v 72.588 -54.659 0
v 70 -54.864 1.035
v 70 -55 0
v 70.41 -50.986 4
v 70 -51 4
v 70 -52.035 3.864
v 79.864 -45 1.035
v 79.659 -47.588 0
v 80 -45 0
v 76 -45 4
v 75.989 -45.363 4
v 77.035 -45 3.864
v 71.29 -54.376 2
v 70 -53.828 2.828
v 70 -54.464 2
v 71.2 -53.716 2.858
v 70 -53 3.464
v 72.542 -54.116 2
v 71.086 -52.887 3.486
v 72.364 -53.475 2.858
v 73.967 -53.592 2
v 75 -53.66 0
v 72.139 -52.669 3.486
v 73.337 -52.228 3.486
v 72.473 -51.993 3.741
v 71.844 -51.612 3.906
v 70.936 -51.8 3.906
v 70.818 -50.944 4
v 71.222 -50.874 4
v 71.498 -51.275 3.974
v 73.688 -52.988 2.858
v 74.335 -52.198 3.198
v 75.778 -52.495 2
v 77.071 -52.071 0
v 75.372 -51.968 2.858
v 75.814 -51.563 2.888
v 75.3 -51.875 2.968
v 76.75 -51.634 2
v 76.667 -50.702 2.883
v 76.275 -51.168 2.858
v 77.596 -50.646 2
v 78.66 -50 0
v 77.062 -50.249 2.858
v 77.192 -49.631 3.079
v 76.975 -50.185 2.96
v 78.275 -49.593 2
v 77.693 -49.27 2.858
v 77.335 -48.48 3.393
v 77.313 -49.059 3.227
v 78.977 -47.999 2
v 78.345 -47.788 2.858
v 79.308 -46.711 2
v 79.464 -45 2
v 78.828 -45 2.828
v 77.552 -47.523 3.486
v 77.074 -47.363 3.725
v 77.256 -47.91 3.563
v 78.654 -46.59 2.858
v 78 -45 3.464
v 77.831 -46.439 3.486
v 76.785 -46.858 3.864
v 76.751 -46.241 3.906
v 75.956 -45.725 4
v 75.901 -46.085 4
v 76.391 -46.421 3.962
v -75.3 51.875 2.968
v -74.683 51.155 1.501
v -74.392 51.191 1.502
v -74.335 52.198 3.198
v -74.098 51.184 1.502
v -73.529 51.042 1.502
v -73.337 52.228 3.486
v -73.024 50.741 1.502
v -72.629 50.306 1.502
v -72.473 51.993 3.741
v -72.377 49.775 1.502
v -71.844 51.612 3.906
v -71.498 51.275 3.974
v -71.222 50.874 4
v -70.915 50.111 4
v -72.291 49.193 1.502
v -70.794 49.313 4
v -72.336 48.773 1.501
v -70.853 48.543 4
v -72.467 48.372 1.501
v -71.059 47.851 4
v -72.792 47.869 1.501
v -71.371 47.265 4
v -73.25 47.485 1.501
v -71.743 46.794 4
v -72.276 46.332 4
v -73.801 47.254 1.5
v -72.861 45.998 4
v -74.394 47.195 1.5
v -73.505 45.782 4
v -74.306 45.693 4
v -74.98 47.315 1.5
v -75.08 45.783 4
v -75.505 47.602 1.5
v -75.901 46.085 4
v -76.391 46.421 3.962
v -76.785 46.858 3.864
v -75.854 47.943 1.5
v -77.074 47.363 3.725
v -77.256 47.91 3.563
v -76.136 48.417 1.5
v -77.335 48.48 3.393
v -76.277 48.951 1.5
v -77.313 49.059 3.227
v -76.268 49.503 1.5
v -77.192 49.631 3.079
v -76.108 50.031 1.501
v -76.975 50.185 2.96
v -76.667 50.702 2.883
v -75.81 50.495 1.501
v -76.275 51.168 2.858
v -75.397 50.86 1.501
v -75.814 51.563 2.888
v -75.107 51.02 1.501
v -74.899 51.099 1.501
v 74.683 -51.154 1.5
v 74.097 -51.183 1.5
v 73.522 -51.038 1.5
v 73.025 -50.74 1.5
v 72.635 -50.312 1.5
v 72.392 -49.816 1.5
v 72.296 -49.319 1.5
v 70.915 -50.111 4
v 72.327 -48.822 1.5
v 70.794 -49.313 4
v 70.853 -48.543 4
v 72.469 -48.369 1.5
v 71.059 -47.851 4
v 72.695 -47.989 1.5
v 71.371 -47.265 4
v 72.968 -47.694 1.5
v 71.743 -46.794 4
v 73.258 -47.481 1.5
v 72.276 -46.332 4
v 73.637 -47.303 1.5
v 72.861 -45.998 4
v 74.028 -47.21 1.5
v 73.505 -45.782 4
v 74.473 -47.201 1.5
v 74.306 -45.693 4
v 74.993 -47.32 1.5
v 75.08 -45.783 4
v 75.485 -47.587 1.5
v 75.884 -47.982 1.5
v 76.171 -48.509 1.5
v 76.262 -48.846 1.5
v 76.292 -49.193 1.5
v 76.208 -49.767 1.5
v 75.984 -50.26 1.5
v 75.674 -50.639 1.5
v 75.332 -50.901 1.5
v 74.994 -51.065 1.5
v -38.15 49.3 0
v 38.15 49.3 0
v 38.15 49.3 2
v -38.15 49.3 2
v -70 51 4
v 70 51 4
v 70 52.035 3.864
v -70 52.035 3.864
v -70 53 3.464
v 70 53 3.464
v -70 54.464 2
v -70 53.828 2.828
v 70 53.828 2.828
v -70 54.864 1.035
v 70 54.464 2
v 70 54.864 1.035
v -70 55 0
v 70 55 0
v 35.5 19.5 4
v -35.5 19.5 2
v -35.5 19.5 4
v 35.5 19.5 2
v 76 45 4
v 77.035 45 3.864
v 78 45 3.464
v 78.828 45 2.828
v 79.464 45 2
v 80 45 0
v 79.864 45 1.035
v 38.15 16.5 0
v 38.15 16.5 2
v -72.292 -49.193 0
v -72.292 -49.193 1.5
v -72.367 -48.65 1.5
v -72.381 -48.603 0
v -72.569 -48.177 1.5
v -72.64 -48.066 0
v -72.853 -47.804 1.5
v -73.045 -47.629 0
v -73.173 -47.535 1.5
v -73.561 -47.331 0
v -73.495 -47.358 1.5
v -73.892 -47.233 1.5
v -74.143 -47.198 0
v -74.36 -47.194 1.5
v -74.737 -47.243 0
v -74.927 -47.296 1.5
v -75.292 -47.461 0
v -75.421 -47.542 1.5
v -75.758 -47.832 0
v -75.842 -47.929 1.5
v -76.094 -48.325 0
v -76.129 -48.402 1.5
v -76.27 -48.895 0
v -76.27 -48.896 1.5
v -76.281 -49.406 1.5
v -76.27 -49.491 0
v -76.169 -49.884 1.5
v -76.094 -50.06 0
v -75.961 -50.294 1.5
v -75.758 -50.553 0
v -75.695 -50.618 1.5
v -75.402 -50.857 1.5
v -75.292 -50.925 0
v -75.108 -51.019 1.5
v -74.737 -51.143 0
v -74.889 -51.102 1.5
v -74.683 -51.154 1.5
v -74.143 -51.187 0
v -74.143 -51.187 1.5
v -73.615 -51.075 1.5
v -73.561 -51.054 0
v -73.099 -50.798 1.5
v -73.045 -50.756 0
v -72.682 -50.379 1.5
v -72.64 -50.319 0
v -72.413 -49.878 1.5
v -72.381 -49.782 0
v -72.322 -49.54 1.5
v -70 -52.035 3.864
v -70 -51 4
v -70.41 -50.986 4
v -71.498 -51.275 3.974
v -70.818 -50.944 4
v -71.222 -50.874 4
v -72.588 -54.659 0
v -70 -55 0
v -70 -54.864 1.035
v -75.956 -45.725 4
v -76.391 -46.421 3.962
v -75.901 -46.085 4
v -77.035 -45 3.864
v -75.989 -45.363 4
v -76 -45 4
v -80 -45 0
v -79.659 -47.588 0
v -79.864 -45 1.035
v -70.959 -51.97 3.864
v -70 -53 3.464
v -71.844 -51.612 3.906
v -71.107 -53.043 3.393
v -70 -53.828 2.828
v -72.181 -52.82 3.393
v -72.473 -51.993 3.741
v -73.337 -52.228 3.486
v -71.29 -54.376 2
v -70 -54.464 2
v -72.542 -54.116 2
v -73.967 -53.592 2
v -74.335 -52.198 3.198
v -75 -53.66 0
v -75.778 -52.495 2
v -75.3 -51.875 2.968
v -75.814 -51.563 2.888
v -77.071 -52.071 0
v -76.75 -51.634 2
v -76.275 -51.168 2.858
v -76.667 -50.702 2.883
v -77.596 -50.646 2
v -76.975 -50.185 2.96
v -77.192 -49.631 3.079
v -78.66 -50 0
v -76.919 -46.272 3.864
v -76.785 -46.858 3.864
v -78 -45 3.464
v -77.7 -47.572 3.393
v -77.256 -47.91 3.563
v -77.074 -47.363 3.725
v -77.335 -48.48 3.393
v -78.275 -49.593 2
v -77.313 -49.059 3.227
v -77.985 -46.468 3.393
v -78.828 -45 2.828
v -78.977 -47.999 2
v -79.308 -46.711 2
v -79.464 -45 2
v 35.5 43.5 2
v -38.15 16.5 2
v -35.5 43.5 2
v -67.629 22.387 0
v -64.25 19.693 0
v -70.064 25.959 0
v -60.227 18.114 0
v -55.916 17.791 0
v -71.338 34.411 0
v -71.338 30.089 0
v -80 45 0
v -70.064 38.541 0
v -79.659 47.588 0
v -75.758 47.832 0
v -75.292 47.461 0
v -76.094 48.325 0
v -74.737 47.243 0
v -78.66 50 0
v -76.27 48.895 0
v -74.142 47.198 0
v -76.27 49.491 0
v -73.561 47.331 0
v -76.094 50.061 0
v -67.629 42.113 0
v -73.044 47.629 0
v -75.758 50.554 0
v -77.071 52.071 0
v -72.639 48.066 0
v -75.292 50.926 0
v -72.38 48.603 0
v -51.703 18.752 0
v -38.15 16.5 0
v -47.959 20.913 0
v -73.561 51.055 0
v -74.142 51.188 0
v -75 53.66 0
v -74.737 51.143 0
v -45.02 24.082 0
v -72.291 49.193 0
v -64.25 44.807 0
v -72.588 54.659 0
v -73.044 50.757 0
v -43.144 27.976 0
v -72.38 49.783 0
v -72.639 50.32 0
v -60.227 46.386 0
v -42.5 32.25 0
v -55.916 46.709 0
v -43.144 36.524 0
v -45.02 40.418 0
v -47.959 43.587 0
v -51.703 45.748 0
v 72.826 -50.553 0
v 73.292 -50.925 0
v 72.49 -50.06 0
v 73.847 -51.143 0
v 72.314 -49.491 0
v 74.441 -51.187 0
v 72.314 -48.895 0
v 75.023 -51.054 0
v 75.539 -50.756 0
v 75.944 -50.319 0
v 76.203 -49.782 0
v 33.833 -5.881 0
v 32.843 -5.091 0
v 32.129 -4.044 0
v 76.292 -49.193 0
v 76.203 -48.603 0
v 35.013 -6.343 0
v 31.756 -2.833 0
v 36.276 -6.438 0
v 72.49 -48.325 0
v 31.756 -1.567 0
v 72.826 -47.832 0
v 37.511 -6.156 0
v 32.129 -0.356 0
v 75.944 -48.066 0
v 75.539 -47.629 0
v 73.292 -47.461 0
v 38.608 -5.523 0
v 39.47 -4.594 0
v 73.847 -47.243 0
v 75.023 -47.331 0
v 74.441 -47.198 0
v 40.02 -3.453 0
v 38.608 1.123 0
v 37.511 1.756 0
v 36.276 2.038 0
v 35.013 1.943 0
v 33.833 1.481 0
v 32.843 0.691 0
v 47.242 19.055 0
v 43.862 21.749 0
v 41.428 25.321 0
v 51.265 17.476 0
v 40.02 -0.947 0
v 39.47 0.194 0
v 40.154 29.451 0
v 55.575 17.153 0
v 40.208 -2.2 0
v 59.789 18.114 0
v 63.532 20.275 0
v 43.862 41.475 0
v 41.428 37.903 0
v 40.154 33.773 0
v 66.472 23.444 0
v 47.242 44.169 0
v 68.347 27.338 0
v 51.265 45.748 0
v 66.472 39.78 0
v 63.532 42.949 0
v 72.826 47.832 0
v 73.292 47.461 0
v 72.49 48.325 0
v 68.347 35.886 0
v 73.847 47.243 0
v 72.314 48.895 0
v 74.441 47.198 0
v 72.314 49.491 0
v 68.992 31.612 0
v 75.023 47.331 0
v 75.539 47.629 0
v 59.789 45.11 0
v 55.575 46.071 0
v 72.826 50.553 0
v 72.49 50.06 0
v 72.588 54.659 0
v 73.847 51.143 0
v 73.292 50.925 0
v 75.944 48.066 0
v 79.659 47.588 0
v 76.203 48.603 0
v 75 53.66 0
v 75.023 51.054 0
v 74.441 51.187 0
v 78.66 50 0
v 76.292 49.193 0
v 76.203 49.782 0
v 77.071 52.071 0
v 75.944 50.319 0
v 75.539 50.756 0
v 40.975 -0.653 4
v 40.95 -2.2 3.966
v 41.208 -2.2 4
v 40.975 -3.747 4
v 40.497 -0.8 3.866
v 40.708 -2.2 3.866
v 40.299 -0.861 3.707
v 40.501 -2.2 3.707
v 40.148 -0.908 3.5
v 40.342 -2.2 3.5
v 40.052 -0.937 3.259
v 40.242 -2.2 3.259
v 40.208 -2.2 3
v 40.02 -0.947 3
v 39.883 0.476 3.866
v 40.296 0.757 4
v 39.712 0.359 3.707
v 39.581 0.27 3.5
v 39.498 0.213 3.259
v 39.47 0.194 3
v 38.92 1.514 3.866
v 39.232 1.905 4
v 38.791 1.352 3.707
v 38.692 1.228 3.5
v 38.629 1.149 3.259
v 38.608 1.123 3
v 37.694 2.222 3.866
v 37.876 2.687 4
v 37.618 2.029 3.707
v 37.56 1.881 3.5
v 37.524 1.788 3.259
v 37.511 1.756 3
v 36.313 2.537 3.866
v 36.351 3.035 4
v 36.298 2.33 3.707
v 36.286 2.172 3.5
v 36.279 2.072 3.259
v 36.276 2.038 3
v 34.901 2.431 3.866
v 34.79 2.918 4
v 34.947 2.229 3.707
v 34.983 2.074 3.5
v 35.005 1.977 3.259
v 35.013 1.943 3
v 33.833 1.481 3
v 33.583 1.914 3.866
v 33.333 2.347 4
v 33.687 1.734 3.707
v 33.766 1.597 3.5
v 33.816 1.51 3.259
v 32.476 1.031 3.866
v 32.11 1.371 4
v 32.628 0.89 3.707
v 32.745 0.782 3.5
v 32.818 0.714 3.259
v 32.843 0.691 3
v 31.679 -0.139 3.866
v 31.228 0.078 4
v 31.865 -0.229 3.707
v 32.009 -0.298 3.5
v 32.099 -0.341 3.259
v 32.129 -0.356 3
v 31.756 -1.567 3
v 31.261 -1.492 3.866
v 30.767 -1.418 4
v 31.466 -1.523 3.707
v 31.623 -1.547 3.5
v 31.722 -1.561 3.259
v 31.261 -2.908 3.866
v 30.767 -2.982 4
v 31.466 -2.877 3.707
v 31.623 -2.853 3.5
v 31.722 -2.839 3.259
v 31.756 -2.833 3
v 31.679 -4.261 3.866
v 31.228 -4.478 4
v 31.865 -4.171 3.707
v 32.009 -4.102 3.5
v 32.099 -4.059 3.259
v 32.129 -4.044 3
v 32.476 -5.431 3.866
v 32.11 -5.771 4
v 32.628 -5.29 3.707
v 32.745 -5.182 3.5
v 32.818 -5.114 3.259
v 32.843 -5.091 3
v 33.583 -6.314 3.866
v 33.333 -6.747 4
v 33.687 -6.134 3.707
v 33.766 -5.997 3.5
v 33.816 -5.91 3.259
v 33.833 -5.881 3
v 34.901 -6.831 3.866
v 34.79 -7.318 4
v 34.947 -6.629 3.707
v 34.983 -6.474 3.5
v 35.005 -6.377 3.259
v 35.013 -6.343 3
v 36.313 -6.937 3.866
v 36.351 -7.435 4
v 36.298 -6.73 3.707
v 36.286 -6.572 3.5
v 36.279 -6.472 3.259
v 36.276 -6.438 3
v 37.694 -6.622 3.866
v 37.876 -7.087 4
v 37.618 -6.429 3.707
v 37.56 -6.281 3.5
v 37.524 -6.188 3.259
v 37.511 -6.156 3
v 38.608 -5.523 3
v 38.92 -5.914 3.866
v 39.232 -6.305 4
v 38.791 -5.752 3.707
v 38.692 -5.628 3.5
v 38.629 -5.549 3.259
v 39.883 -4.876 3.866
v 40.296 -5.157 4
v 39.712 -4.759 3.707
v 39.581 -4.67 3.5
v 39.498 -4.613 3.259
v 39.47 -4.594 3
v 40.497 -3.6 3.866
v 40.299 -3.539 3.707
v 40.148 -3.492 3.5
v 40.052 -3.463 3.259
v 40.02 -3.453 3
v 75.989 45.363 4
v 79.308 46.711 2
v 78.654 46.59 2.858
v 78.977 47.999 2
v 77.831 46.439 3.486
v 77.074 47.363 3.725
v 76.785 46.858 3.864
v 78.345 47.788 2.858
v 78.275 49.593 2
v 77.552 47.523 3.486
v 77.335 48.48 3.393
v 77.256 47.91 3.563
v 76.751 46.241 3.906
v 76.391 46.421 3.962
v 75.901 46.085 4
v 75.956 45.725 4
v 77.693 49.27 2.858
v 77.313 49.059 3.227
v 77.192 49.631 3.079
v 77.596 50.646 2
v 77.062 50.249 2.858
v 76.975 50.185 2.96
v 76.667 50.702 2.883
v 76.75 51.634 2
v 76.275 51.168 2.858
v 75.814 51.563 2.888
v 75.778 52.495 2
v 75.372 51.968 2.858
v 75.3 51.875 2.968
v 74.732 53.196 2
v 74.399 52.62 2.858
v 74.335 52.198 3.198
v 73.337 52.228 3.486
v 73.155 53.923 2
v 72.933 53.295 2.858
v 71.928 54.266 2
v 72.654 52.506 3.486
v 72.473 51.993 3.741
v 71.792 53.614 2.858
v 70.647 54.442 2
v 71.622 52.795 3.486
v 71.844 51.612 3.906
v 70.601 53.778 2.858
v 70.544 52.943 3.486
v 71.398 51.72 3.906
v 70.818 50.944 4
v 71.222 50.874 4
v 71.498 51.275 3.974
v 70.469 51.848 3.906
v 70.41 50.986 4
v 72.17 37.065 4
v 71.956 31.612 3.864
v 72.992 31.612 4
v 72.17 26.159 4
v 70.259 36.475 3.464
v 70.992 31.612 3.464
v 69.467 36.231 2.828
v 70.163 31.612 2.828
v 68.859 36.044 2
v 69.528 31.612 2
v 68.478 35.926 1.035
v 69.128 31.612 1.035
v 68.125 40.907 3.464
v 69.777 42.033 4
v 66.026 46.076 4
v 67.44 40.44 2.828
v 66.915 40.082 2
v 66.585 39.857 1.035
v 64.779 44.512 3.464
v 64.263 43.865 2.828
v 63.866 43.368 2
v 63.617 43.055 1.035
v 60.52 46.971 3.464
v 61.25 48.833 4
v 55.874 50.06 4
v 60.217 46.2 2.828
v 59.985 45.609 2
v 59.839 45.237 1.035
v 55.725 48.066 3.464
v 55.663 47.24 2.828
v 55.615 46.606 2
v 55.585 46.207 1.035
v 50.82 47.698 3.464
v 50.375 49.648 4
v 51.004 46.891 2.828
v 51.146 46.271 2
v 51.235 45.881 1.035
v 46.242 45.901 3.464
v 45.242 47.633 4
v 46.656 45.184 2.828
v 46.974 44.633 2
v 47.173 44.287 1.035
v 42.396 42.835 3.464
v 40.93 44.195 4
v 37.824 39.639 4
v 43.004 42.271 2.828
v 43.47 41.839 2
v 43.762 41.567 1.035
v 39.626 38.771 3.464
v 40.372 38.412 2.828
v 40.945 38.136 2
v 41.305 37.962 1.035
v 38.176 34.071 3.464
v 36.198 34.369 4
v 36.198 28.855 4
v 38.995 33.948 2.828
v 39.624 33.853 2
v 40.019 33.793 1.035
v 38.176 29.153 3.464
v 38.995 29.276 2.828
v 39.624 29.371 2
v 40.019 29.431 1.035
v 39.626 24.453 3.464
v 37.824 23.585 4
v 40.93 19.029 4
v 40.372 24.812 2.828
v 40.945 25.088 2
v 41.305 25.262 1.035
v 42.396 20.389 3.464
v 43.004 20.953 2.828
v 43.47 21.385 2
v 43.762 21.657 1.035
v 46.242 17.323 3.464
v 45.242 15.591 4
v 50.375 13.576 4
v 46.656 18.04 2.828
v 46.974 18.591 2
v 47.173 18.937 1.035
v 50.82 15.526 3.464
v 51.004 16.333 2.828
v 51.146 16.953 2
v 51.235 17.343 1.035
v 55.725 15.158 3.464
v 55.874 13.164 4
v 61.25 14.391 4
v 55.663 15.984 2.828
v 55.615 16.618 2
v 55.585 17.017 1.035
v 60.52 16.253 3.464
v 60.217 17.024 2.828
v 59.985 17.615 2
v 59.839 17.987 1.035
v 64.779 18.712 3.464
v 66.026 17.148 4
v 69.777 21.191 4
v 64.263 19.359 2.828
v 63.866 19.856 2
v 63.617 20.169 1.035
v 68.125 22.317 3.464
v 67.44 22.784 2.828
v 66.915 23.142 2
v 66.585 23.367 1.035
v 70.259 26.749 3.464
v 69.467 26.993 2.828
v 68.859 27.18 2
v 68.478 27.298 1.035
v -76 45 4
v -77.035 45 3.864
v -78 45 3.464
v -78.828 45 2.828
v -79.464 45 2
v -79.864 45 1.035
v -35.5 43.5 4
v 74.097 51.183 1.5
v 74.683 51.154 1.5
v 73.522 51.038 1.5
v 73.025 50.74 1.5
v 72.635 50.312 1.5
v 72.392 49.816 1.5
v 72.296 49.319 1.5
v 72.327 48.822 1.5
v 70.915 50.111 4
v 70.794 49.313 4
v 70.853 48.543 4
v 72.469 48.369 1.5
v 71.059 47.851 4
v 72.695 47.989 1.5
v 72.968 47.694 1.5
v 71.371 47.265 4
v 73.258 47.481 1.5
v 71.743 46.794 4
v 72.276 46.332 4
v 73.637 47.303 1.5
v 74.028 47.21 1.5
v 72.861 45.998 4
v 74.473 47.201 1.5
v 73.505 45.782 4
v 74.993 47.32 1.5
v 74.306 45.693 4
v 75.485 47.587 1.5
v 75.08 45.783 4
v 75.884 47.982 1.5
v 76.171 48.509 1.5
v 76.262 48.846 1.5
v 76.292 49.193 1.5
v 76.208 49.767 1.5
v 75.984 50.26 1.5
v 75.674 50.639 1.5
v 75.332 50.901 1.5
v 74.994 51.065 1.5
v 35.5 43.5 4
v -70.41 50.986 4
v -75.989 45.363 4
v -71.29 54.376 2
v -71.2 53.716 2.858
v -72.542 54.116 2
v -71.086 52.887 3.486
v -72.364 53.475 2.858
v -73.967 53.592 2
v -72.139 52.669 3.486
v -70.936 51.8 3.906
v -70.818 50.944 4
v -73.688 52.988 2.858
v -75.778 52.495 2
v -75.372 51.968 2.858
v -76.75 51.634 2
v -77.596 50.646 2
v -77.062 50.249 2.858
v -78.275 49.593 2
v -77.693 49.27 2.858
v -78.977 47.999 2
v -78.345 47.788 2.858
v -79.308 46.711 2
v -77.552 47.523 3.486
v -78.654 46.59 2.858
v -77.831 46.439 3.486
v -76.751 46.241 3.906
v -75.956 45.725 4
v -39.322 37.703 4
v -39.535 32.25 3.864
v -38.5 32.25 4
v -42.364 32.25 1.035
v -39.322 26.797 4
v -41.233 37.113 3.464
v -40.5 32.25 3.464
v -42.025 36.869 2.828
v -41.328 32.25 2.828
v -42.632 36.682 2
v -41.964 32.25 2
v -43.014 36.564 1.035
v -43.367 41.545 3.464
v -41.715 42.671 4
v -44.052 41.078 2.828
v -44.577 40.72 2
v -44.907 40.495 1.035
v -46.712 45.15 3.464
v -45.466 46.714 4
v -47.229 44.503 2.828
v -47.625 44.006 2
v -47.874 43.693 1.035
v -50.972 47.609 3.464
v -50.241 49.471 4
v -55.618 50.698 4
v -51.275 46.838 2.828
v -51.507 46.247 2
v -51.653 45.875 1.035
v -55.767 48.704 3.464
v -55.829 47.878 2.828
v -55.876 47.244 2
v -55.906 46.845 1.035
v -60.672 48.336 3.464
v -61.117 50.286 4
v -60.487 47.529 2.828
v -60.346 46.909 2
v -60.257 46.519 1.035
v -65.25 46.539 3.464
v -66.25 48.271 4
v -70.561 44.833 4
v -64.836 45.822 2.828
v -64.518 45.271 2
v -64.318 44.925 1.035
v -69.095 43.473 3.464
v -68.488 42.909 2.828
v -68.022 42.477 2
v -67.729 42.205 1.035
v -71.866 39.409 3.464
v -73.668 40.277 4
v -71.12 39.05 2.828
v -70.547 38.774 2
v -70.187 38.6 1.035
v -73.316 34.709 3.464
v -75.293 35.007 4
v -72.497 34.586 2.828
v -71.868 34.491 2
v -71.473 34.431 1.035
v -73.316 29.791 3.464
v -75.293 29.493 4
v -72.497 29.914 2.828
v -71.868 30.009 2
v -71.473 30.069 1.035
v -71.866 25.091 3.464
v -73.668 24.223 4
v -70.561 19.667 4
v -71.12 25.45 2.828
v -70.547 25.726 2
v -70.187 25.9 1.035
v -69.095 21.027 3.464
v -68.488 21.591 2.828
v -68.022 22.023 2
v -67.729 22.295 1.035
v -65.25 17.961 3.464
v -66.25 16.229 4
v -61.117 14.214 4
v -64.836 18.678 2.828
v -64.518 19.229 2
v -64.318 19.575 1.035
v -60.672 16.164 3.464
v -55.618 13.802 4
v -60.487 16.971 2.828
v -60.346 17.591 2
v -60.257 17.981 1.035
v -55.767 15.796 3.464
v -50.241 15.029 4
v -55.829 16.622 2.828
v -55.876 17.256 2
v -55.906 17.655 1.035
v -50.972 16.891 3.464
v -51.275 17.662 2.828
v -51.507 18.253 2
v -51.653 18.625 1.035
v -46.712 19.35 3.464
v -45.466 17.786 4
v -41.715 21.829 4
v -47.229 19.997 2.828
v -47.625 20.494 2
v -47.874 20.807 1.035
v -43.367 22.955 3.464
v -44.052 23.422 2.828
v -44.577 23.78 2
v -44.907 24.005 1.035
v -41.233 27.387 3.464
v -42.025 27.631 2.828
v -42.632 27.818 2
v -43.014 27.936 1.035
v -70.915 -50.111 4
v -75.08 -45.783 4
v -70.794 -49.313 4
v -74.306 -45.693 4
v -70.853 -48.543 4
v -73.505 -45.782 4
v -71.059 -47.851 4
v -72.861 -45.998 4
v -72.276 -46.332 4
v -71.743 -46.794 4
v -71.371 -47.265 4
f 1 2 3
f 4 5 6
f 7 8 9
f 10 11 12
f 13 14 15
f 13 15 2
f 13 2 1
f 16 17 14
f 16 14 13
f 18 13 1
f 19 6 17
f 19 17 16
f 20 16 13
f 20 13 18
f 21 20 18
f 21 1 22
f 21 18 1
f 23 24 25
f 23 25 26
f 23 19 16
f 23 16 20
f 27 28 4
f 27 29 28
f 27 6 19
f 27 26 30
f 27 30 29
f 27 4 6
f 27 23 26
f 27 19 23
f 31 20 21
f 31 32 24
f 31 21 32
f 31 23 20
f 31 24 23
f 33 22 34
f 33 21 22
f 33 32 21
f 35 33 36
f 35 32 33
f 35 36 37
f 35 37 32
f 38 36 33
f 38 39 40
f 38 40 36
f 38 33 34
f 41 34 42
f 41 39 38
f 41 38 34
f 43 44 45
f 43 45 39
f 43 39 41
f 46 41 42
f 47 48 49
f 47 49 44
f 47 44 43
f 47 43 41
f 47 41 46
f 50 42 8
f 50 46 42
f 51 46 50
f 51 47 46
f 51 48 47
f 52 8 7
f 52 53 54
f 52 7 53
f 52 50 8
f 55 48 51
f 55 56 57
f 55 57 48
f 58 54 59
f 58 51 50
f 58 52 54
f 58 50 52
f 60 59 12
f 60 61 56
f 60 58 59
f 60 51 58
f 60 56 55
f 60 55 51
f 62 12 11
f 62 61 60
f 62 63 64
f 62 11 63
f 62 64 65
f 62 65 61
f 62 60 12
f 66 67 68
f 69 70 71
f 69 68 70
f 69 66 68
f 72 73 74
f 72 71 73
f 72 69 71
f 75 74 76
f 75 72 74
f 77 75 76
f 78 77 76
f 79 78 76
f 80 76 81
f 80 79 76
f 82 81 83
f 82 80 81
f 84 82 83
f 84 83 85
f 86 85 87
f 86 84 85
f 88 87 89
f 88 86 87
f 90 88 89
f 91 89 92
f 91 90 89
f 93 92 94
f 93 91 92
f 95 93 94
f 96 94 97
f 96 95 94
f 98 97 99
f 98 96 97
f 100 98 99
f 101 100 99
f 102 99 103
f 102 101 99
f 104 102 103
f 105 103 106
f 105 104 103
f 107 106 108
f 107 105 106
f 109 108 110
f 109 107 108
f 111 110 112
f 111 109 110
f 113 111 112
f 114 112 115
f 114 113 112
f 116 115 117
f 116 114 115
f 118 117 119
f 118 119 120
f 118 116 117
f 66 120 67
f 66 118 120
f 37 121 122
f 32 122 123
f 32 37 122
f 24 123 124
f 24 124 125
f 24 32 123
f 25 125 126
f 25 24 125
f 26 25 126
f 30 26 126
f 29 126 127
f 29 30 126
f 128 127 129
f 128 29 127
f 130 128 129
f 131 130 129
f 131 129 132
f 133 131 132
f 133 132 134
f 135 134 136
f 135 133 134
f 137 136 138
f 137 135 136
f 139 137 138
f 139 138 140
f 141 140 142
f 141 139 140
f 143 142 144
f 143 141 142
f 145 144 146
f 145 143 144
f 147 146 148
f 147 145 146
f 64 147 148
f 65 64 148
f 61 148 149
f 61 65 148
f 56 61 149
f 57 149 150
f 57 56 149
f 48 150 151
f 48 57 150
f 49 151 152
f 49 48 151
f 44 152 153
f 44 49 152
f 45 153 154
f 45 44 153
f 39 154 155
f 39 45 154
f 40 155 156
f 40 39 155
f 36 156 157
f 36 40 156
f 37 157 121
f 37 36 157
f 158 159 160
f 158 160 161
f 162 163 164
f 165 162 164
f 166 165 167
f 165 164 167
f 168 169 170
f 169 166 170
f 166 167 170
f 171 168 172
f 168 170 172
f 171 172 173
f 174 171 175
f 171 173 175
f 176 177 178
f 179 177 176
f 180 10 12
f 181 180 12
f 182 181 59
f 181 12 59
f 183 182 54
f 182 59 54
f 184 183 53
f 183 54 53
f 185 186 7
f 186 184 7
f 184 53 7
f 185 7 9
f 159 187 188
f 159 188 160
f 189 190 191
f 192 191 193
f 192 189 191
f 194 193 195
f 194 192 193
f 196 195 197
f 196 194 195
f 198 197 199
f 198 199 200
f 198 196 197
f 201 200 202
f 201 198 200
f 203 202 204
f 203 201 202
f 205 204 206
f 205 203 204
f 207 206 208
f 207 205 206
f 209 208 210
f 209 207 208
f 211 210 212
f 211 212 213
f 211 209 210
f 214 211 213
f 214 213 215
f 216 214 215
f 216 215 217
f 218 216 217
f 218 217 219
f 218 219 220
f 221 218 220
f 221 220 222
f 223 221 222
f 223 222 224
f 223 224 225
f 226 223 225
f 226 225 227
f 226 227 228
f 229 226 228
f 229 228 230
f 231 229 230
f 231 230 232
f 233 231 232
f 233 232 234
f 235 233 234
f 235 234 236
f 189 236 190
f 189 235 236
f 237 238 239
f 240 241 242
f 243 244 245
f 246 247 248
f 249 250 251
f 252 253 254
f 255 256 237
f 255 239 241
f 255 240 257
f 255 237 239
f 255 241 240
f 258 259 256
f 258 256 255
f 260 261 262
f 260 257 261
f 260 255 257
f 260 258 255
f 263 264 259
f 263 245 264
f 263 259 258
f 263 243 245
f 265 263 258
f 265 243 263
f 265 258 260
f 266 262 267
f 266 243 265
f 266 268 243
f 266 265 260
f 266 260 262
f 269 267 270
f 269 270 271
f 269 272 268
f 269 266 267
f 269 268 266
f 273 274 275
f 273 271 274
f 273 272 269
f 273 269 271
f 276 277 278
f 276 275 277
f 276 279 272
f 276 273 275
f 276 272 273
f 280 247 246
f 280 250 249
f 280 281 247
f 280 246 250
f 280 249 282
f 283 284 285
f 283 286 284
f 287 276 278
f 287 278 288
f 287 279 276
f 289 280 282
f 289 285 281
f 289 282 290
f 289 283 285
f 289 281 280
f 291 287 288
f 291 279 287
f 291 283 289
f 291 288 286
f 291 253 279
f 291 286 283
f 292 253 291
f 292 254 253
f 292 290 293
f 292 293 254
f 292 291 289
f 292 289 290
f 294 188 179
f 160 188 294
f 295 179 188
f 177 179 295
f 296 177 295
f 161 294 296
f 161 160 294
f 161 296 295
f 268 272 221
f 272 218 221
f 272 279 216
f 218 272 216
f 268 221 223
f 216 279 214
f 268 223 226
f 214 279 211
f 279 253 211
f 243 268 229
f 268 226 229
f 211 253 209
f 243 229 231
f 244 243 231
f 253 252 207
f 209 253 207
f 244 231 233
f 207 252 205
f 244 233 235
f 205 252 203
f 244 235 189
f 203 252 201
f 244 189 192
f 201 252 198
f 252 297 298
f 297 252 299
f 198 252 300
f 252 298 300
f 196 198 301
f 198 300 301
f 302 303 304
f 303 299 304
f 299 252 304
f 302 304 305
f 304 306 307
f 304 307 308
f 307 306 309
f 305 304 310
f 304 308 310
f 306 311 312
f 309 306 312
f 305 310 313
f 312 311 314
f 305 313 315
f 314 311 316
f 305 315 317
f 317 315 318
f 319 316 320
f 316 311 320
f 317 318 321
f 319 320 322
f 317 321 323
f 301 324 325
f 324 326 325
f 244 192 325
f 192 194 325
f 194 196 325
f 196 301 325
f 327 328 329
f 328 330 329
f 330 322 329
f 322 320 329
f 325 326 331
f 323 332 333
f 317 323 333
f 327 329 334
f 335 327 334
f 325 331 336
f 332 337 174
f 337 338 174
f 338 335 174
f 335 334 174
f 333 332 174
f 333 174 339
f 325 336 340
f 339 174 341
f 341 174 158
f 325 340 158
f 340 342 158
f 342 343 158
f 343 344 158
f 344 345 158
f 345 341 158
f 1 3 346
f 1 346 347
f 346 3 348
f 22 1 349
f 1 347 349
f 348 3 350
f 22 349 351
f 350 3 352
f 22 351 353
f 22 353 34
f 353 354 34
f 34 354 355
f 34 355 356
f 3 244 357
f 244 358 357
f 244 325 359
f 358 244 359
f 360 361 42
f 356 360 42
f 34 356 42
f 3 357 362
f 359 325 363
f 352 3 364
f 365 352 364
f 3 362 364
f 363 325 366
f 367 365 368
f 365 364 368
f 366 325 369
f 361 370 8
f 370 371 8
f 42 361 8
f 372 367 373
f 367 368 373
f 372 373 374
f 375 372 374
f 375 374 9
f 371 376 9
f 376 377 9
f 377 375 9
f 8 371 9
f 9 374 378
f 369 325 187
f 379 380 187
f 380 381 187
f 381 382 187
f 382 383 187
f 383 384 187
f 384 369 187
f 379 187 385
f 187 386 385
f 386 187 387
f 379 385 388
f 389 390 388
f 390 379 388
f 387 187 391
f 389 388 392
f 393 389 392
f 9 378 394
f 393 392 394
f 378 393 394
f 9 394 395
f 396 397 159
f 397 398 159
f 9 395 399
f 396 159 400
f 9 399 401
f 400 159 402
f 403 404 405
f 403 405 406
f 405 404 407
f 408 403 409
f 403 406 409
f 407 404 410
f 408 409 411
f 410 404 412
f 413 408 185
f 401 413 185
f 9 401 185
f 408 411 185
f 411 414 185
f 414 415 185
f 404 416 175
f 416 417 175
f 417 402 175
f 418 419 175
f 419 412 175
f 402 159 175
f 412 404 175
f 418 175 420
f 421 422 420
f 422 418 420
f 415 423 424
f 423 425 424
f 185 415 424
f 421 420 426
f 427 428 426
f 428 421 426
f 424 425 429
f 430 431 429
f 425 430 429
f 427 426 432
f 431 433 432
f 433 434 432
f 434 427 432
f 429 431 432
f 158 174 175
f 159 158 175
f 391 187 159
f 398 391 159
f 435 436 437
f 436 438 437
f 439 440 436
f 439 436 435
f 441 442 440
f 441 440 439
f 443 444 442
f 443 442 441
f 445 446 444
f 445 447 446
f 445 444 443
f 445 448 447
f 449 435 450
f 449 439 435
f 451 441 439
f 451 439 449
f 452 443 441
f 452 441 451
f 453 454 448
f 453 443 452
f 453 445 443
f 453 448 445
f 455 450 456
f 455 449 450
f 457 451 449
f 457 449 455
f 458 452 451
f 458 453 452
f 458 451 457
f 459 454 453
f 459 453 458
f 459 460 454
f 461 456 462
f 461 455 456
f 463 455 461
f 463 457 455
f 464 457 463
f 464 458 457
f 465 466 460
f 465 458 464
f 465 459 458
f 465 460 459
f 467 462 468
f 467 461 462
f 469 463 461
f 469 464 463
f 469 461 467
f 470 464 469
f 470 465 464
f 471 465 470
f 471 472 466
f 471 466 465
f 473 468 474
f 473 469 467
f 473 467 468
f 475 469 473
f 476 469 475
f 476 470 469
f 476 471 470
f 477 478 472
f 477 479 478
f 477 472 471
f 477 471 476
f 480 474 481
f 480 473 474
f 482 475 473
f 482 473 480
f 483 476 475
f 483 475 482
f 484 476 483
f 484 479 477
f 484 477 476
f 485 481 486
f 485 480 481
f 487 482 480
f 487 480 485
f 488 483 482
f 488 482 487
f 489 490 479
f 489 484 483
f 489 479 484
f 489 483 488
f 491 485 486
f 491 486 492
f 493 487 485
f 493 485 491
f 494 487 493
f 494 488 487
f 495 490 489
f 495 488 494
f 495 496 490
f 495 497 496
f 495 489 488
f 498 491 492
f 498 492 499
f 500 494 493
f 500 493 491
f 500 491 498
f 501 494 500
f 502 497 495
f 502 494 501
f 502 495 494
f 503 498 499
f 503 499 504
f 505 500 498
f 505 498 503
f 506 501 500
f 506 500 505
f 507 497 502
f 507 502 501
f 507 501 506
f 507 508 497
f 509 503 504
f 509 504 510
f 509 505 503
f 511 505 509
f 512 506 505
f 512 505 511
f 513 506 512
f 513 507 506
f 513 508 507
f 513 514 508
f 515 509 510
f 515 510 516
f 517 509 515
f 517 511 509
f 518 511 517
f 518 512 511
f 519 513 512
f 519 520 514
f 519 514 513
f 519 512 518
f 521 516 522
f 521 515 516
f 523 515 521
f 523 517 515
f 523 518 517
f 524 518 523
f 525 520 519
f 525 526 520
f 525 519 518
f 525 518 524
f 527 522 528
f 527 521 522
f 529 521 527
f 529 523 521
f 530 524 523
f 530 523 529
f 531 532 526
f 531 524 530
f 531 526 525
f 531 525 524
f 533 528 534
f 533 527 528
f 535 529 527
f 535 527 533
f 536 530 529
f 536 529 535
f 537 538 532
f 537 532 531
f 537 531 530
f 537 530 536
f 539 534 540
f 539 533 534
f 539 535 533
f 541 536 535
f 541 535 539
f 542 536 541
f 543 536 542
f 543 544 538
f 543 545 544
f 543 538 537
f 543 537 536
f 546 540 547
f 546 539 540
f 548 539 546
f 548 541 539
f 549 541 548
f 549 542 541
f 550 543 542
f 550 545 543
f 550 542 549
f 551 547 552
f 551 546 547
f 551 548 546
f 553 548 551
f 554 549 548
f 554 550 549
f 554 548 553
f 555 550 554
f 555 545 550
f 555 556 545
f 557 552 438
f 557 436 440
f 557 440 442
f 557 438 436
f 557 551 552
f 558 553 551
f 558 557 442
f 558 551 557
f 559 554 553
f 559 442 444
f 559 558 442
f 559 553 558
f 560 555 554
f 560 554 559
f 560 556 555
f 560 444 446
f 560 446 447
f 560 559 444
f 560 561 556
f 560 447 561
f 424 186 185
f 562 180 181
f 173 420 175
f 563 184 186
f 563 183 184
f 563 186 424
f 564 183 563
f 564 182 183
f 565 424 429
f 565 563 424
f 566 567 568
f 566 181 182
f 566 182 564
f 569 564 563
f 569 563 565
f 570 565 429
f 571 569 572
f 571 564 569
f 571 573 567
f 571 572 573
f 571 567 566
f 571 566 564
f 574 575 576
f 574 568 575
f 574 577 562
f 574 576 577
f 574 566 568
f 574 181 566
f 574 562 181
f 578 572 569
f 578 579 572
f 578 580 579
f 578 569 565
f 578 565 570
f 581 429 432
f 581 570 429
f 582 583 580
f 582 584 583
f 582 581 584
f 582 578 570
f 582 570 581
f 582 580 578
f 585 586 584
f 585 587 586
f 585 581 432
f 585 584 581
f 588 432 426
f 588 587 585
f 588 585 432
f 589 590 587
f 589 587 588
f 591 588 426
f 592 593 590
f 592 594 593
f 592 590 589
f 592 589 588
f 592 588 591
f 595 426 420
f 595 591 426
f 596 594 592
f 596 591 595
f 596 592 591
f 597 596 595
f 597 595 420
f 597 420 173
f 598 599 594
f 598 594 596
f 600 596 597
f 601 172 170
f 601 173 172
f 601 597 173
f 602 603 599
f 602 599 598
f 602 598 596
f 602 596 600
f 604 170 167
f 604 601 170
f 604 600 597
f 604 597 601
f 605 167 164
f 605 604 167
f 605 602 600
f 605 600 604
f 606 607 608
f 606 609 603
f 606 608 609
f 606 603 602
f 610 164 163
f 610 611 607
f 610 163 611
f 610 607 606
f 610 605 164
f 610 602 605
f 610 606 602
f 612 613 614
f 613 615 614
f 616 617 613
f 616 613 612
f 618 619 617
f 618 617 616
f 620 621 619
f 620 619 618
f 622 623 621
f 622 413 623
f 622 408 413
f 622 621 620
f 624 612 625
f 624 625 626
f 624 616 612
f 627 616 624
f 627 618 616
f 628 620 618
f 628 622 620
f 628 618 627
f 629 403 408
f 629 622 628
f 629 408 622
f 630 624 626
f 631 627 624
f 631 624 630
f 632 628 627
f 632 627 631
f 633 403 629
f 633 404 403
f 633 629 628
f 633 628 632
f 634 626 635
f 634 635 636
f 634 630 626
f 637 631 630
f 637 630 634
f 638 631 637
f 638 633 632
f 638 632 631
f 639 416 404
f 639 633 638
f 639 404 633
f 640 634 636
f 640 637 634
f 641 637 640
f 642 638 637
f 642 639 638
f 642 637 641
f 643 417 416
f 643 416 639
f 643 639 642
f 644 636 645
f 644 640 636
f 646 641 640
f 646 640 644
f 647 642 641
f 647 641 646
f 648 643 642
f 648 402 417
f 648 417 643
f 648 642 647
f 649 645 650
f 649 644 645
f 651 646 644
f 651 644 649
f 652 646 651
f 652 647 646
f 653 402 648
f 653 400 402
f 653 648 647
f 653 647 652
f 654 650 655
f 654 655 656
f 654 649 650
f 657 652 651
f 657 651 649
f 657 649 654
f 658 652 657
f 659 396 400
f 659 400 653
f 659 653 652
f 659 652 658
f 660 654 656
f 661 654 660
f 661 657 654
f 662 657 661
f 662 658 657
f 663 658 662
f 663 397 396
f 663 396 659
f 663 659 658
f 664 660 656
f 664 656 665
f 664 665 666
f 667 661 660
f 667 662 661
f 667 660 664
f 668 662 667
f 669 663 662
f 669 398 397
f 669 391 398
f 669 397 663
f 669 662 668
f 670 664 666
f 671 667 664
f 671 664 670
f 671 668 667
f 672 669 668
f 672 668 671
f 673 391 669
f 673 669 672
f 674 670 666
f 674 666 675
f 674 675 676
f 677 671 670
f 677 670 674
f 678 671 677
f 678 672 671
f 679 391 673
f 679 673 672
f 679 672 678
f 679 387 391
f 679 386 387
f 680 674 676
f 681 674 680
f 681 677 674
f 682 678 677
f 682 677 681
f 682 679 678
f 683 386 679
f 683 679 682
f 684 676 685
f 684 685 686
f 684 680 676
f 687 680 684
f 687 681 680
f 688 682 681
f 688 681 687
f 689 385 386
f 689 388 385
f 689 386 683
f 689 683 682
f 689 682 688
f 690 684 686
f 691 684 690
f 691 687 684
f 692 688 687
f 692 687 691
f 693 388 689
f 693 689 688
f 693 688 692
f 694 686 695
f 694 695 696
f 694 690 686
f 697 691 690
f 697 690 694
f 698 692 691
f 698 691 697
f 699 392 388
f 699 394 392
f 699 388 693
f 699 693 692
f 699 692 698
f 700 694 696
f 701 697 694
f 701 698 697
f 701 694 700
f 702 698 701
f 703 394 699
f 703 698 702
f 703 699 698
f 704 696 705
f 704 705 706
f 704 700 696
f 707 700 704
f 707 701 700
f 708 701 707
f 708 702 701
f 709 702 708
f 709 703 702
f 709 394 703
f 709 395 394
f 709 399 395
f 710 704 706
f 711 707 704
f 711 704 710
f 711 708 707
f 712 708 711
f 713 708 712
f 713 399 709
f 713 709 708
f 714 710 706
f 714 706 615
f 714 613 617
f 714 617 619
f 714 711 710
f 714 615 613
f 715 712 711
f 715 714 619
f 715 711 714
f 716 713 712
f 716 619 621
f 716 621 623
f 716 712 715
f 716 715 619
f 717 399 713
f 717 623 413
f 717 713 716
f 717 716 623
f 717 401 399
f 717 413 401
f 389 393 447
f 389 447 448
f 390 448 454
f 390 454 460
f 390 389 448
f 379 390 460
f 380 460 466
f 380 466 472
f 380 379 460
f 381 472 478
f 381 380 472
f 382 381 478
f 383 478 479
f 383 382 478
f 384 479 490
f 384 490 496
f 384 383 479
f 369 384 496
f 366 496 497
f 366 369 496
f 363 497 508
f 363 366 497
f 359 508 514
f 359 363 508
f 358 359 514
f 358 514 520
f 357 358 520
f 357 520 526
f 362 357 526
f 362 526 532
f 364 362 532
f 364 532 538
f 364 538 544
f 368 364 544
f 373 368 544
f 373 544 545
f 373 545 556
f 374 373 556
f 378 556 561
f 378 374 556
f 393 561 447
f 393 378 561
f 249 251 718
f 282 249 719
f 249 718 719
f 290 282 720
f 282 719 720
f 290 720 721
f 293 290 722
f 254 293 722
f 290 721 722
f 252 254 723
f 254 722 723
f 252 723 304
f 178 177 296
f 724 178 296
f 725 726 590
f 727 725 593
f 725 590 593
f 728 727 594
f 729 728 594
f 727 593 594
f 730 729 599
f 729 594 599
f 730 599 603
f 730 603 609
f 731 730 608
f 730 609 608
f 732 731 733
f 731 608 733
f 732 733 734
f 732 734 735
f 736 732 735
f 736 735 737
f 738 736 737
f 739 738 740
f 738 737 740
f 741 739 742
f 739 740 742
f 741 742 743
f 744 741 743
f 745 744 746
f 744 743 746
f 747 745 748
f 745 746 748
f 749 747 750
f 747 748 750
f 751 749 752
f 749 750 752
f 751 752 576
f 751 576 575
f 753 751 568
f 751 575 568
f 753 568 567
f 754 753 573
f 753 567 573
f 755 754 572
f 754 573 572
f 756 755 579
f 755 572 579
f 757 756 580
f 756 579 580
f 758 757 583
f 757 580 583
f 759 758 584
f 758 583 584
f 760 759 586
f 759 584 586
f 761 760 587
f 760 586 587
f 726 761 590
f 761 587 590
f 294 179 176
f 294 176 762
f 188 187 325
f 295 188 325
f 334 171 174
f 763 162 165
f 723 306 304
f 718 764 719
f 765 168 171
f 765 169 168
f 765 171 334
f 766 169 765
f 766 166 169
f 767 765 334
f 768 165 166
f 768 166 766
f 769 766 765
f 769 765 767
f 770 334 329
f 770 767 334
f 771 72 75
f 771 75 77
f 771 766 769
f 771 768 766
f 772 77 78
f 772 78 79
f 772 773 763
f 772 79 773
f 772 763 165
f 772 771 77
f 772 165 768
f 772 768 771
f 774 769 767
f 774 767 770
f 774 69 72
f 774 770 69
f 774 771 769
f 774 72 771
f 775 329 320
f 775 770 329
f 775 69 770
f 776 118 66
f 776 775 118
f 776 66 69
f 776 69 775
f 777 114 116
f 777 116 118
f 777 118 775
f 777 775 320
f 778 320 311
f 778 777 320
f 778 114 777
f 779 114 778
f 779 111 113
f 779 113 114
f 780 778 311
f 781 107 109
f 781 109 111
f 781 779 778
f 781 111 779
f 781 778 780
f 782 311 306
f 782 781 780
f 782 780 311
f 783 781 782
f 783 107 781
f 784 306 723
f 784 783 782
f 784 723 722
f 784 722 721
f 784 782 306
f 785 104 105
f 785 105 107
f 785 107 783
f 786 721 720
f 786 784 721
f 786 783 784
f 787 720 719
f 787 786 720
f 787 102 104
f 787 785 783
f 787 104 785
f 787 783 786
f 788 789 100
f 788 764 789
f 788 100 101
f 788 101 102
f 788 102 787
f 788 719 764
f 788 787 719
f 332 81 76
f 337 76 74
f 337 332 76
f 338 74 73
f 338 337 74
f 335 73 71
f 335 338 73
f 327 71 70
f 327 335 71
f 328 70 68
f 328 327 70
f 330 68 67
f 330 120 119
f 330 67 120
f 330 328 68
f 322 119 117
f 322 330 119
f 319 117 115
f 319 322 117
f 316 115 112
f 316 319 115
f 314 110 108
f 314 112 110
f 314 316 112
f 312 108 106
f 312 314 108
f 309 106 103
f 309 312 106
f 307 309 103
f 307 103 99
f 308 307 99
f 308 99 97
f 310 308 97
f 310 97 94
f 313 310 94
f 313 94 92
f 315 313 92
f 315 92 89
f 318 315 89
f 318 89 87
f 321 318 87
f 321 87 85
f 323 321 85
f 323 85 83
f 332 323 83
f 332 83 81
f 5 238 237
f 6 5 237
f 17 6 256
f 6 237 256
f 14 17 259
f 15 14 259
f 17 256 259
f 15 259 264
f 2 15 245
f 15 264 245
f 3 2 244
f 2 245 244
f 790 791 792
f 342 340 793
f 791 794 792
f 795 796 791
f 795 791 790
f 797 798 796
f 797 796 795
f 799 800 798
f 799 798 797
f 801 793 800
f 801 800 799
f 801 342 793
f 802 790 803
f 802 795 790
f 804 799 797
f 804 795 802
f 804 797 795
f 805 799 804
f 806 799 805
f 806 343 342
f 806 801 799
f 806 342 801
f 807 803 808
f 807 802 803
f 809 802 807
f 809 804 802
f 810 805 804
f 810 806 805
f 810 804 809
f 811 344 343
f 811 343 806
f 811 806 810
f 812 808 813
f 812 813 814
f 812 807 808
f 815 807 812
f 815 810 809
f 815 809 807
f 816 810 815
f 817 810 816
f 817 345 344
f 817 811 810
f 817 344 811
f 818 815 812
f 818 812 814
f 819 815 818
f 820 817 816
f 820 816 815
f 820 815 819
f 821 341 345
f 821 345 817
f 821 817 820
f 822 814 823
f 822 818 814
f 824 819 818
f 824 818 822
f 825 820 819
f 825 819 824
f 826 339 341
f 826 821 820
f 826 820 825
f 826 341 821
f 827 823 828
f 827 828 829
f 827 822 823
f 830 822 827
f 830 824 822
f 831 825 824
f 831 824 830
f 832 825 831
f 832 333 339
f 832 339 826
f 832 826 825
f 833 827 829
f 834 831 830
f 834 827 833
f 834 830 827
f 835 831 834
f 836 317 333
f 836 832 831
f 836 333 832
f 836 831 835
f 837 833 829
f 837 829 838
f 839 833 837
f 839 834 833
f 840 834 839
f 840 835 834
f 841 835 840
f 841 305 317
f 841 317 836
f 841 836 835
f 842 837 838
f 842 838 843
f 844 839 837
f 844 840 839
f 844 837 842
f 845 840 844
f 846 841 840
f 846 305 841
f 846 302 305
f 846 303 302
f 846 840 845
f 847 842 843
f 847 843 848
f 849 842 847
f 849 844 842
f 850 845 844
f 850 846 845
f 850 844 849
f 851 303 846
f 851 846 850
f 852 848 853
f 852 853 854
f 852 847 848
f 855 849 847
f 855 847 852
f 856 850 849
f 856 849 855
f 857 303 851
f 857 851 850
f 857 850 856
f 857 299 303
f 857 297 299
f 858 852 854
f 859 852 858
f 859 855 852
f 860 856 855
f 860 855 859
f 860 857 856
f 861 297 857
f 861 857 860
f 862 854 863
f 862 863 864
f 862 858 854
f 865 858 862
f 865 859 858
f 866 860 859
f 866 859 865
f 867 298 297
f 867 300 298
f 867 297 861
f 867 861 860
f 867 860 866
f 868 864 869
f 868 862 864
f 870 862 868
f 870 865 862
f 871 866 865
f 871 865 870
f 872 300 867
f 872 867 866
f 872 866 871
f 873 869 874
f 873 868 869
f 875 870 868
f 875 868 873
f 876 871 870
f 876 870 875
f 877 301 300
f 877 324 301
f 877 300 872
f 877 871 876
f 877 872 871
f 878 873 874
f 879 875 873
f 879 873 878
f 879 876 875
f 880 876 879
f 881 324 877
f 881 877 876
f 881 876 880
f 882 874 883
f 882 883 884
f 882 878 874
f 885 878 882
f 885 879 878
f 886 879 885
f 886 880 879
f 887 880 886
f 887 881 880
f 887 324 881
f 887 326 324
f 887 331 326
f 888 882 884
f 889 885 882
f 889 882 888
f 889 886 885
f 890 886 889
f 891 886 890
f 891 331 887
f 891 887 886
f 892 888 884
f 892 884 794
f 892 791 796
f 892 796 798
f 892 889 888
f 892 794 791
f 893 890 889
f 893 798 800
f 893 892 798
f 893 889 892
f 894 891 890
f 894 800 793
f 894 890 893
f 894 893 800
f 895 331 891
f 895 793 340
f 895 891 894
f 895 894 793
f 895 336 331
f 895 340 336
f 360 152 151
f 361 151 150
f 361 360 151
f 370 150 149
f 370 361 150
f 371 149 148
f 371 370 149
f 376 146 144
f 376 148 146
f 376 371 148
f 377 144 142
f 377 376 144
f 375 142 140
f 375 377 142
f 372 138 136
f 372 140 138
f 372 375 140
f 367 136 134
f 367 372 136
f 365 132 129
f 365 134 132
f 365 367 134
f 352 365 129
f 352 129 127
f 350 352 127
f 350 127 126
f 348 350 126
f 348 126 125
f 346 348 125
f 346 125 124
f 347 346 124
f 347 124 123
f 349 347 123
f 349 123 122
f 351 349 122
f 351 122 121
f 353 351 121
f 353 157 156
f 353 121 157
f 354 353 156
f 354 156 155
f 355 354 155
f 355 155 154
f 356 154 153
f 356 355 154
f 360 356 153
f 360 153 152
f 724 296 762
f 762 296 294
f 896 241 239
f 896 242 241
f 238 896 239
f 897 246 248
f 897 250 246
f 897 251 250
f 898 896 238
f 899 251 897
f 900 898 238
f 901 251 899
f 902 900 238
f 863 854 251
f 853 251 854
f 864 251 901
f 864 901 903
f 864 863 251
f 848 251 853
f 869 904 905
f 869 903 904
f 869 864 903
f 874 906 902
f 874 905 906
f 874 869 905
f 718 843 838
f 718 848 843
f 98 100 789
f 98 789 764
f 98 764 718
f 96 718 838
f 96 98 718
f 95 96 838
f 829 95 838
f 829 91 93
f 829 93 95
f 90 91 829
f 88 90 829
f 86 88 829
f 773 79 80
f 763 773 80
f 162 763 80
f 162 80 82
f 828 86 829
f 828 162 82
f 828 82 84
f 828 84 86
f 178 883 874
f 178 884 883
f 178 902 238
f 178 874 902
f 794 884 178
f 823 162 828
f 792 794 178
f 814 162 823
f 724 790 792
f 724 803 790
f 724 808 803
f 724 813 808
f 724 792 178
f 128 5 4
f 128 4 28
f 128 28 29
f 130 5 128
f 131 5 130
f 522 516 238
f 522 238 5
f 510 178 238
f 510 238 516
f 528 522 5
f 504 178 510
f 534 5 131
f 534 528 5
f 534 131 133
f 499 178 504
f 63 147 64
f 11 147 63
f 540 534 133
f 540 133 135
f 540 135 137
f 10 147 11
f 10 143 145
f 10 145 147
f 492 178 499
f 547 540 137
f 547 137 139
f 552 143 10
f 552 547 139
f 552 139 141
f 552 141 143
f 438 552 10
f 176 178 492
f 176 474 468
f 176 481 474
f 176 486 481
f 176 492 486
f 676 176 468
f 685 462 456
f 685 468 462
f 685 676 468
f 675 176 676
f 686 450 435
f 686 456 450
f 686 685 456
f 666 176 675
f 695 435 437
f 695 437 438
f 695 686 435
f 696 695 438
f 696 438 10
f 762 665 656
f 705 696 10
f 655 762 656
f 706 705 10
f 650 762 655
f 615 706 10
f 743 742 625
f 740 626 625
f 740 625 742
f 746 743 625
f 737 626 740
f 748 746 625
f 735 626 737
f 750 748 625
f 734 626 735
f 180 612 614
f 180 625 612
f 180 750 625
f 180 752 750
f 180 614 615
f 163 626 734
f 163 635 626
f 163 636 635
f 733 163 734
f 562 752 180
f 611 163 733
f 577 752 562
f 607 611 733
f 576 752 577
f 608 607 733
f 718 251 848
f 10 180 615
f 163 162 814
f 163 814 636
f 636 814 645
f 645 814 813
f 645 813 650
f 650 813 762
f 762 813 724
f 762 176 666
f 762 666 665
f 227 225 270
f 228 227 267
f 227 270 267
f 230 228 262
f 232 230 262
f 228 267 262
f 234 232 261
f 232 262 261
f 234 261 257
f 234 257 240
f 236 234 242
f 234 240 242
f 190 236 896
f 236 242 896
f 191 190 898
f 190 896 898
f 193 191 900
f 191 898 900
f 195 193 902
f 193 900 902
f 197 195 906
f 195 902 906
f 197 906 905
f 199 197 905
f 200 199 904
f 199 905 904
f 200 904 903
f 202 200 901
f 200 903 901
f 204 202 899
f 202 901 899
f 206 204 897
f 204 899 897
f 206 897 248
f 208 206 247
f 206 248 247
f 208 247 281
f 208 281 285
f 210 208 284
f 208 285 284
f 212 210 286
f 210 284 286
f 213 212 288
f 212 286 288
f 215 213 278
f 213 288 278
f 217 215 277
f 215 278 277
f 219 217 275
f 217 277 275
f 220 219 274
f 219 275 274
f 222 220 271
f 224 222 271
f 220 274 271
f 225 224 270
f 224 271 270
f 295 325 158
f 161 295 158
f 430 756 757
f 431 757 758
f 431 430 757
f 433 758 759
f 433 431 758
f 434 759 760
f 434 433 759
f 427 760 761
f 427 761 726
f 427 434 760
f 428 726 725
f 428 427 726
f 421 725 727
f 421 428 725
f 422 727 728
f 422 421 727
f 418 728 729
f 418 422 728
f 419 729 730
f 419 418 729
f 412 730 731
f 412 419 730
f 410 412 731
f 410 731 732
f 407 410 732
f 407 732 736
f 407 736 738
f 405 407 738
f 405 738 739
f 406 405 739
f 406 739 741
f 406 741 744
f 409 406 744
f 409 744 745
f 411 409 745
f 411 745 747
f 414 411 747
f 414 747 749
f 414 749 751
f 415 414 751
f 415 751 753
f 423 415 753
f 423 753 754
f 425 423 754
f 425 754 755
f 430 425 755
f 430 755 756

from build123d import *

# Parameters (mm, degrees)
IZIM1_W                     = 160
IZIM1_H                     = 110
IZIM1_R                     = 14.5
IZIM1_R_2                   = 4.25
IZIM1_R_3                   = 2
IZIM1_R_4                   = 2.000514333
IZIM1_W_2                   = 71
IZIM1_H_2                   = 24
Y_KSEKLIK_EKSTR_ZYON1_DEPTH = 4
RADYUS1_R                   = 10
RADYUS2_R                   = 4
IZIM2_W                     = 76.3
IZIM2_H                     = 32.8
KES_EKSTR_ZYON1_DEPTH       = 2
RADYUS3_R                   = 4
RADYUS4_R                   = 1


with BuildPart() as part:
    # Çizim1 → Yükseklik-Ekstrüzyon1 (new body)
    with BuildSketch(Plane.XY):
        Rectangle(IZIM1_W, IZIM1_H)
        with Locations((-57, 32.25)):
            Circle(IZIM1_R, mode=Mode.SUBTRACT)
        with Locations((54.491616853, 31.612)):
            Circle(IZIM1_R, mode=Mode.SUBTRACT)
        with Locations((35.958383147, -2.2)):
            Circle(IZIM1_R_2, mode=Mode.SUBTRACT)
        with Locations((-74.291978978, -49.192721843)):
            Circle(IZIM1_R_3, mode=Mode.SUBTRACT)
        with Locations((-74.291616853, 49.193092508)):
            Circle(IZIM1_R_4, mode=Mode.SUBTRACT)
        with Locations((74.291978978, 49.192721843)):
            Circle(IZIM1_R_3, mode=Mode.SUBTRACT)
        with Locations((74.291978978, -49.192721843)):
            Circle(IZIM1_R_3, mode=Mode.SUBTRACT)
        with Locations((0, 31.5)):
            Rectangle(IZIM1_W_2, IZIM1_H_2, mode=Mode.SUBTRACT)
    extrude(amount=Y_KSEKLIK_EKSTR_ZYON1_DEPTH)

    # Radyus1
    radyus1_edges = [part.edges().sort_by_distance(p)[0] for p in [
        (80, -55, 2),
        (-80, -55, 2),
        (-80, 55, 2),
        (80, 55, 2),
    ]]
    fillet(radyus1_edges, radius=RADYUS1_R)

    # Radyus2
    radyus2_edges = [part.edges().sort_by_distance(p)[0] for p in [
        (-71.5, 32.25, 4),
        (39.991616853, 31.612, 4),
    ]]
    fillet(radyus2_edges, radius=RADYUS2_R - 0.0001)  # a hair under: the kernel refuses the full size

    # Çizim2 → Kes-Ekstrüzyon1 (cut)
    with BuildSketch(Plane(origin=(0, 0, 0), x_dir=(-1, 0, 0), z_dir=(0, 0, -1))):
        with Locations((0, 32.9)):
            Rectangle(IZIM2_W, IZIM2_H)
    extrude(amount=-KES_EKSTR_ZYON1_DEPTH, mode=Mode.SUBTRACT)

    # Radyus3
    # the kernel refuses this fillet: 4 mm, written as the material it takes off along each edge
    with BuildSketch(Plane(origin=(-70, 45, 4), x_dir=(0, 1, 0), z_dir=(1, 0, 0))) as radyus3_piece_1:
        with BuildLine():
            CenterArc((10 - RADYUS3_R, -RADYUS3_R), RADYUS3_R, 0, 90)
            Line((10, -RADYUS3_R), (10, 0))
            Line((10, 0), (10 - RADYUS3_R, 0))
        make_face()
    revolve(axis=Axis((-70, 45, 4), (0, 0, 1)), revolution_arc=90, mode=Mode.SUBTRACT)
    with BuildSketch(Plane(origin=(70, 55, 4), x_dir=(0, -1, 0), z_dir=(-1, 0, 0)), Plane(origin=(-70, -55, 4), x_dir=(0, 1, 0), z_dir=(1, 0, 0))) as radyus3_piece_2:
        with BuildLine():
            CenterArc((RADYUS3_R, -RADYUS3_R), RADYUS3_R, 90, 90)
            Line((0, -RADYUS3_R), (0, 0))
            Line((0, 0), (RADYUS3_R, 0))
        make_face()
    extrude(amount=140, mode=Mode.SUBTRACT)
    with BuildSketch(Plane(origin=(70, 45, 4), x_dir=(1, 0, 0), z_dir=(0, -1, 0))) as radyus3_piece_3:
        with BuildLine():
            CenterArc((10 - RADYUS3_R, -RADYUS3_R), RADYUS3_R, 0, 90)
            Line((10, -RADYUS3_R), (10, 0))
            Line((10, 0), (10 - RADYUS3_R, 0))
        make_face()
    revolve(axis=Axis((70, 45, 4), (0, 0, 1)), revolution_arc=90, mode=Mode.SUBTRACT)
    with BuildSketch(Plane(origin=(80, -45, 4), x_dir=(-1, 0, 0), z_dir=(0, 1, 0)), Plane(origin=(-80, 45, 4), x_dir=(1, 0, 0), z_dir=(0, -1, 0))) as radyus3_piece_4:
        with BuildLine():
            CenterArc((RADYUS3_R, -RADYUS3_R), RADYUS3_R, 90, 90)
            Line((0, -RADYUS3_R), (0, 0))
            Line((0, 0), (RADYUS3_R, 0))
        make_face()
    extrude(amount=90, mode=Mode.SUBTRACT)
    with BuildSketch(Plane(origin=(70, -45, 4), x_dir=(0, -1, 0), z_dir=(-1, 0, 0))) as radyus3_piece_5:
        with BuildLine():
            CenterArc((10 - RADYUS3_R, -RADYUS3_R), RADYUS3_R, 0, 90)
            Line((10, -RADYUS3_R), (10, 0))
            Line((10, 0), (10 - RADYUS3_R, 0))
        make_face()
    revolve(axis=Axis((70, -45, 4), (0, 0, 1)), revolution_arc=90, mode=Mode.SUBTRACT)
    with BuildSketch(Plane(origin=(-70, -45, 4), x_dir=(0, -1, 0), z_dir=(1, 0, 0))) as radyus3_piece_6:
        with BuildLine():
            CenterArc((10 - RADYUS3_R, RADYUS3_R), RADYUS3_R, 270, 90)
            Line((10, RADYUS3_R), (10, 0))
            Line((10, 0), (10 - RADYUS3_R, 0))
        make_face()
    revolve(axis=Axis((-70, -45, 4), (0, 0, -1)), revolution_arc=90, mode=Mode.SUBTRACT)

    # Kes-Loft1: read off the stored shape, not the designer's step
    # Kes-Loft1: loft between two sections, ruled curve by curve
    kes_loft1_from = [
        Edge.make_bspline([(-74.682775848, -51.154169728, 1.5), (-70.759880078, -51.935763469, 1.5), (-69.978286337, -48.012867699, 1.5), (-73.901182107, -47.231273958, 1.5), (-77.824077878, -46.449680217, 1.5), (-78.605671618, -50.372575988, 1.5), (-74.682775848, -51.154169728, 1.5)], [0, 0, 0, 0, 0.5, 0.5, 0.5, 1, 1, 1, 1], 3, [1, 0.333333333, 0.333333333, 1, 0.333333333, 0.333333333, 1]),
    ]
    kes_loft1_to = [
        Edge.make_bspline([(-75.734283229, -52.381727715, 4), (-69.356271486, -55.266336217, 4), (-66.471662984, -48.888324474, 4), (-72.849674727, -46.003715972, 4), (-79.227686469, -43.11910747, 4), (-82.112294971, -49.497119212, 4), (-75.734283229, -52.381727715, 4)], [0, 0, 0, 0, 0.5, 0.5, 0.5, 1, 1, 1, 1], 3, [1, 0.333333333, 0.333333333, 1, 0.333333333, 0.333333333, 1]),
    ]
    kes_loft1 = Solid(Shell([*[Face.make_surface_from_curves(kes_loft1_from[k], kes_loft1_to[k]) for k in range(1)], Face(Wire(kes_loft1_from)), Face(Wire(kes_loft1_to))]))
    add(kes_loft1, mode=Mode.SUBTRACT)

    # Aynalama1: read off the stored shape, not the designer's step
    # Aynalama1: loft between two sections, ruled curve by curve
    aynalama1_from = [
        Edge.make_bspline([(74.682775848, -51.154169728, 1.5), (70.759880078, -51.935763469, 1.5), (69.978286337, -48.012867699, 1.5), (73.901182107, -47.231273958, 1.5), (77.824077878, -46.449680217, 1.5), (78.605671618, -50.372575988, 1.5), (74.682775848, -51.154169728, 1.5)], [0, 0, 0, 0, 0.5, 0.5, 0.5, 1, 1, 1, 1], 3, [1, 0.333333333, 0.333333333, 1, 0.333333333, 0.333333333, 1]),
    ]
    aynalama1_to = [
        Edge.make_bspline([(75.734283229, -52.381727715, 4), (69.356271486, -55.266336217, 4), (66.471662984, -48.888324474, 4), (72.849674727, -46.003715972, 4), (79.227686469, -43.11910747, 4), (82.112294971, -49.497119212, 4), (75.734283229, -52.381727715, 4)], [0, 0, 0, 0, 0.5, 0.5, 0.5, 1, 1, 1, 1], 3, [1, 0.333333333, 0.333333333, 1, 0.333333333, 0.333333333, 1]),
    ]
    aynalama1 = Solid(Shell([*[Face.make_surface_from_curves(aynalama1_from[k], aynalama1_to[k]) for k in range(1)], Face(Wire(aynalama1_from)), Face(Wire(aynalama1_to))]))
    add(aynalama1, mode=Mode.SUBTRACT)

    # Aynalama1 2: loft between two sections, ruled curve by curve
    aynalama1_2_from = [
        Edge.make_bspline([(-74.682775848, 51.154169728, 1.5), (-70.759880078, 51.935763469, 1.5), (-69.978286337, 48.012867699, 1.5), (-73.901182107, 47.231273958, 1.5), (-77.824077878, 46.449680217, 1.5), (-78.605671618, 50.372575988, 1.5), (-74.682775848, 51.154169728, 1.5)], [0, 0, 0, 0, 0.5, 0.5, 0.5, 1, 1, 1, 1], 3, [1, 0.333333333, 0.333333333, 1, 0.333333333, 0.333333333, 1]),
    ]
    aynalama1_2_to = [
        Edge.make_bspline([(-75.734283229, 52.381727715, 4), (-69.356271486, 55.266336217, 4), (-66.471662984, 48.888324474, 4), (-72.849674727, 46.003715972, 4), (-79.227686469, 43.11910747, 4), (-82.112294971, 49.497119212, 4), (-75.734283229, 52.381727715, 4)], [0, 0, 0, 0, 0.5, 0.5, 0.5, 1, 1, 1, 1], 3, [1, 0.333333333, 0.333333333, 1, 0.333333333, 0.333333333, 1]),
    ]
    aynalama1_2 = Solid(Shell([*[Face.make_surface_from_curves(aynalama1_2_from[k], aynalama1_2_to[k]) for k in range(1)], Face(Wire(aynalama1_2_from)), Face(Wire(aynalama1_2_to))]))
    add(aynalama1_2, mode=Mode.SUBTRACT)

    # Aynalama1 3: loft between two sections, ruled curve by curve
    aynalama1_3_from = [
        Edge.make_bspline([(74.682775848, 51.154169728, 1.5), (70.759880078, 51.935763469, 1.5), (69.978286337, 48.012867699, 1.5), (73.901182107, 47.231273958, 1.5), (77.824077878, 46.449680217, 1.5), (78.605671618, 50.372575988, 1.5), (74.682775848, 51.154169728, 1.5)], [0, 0, 0, 0, 0.5, 0.5, 0.5, 1, 1, 1, 1], 3, [1, 0.333333333, 0.333333333, 1, 0.333333333, 0.333333333, 1]),
    ]
    aynalama1_3_to = [
        Edge.make_bspline([(75.734283229, 52.381727715, 4), (69.356271486, 55.266336217, 4), (66.471662984, 48.888324474, 4), (72.849674727, 46.003715972, 4), (79.227686469, 43.11910747, 4), (82.112294971, 49.497119212, 4), (75.734283229, 52.381727715, 4)], [0, 0, 0, 0, 0.5, 0.5, 0.5, 1, 1, 1, 1], 3, [1, 0.333333333, 0.333333333, 1, 0.333333333, 0.333333333, 1]),
    ]
    aynalama1_3 = Solid(Shell([*[Face.make_surface_from_curves(aynalama1_3_from[k], aynalama1_3_to[k]) for k in range(1)], Face(Wire(aynalama1_3_from)), Face(Wire(aynalama1_3_to))]))
    add(aynalama1_3, mode=Mode.SUBTRACT)

    # Radyus4
    radyus4_edges = [part.edges().sort_by_distance(p)[0] for p in [
        (31.708383147, -2.2, 4),
    ]]
    fillet(radyus4_edges, radius=RADYUS4_R)


solid = part.part
